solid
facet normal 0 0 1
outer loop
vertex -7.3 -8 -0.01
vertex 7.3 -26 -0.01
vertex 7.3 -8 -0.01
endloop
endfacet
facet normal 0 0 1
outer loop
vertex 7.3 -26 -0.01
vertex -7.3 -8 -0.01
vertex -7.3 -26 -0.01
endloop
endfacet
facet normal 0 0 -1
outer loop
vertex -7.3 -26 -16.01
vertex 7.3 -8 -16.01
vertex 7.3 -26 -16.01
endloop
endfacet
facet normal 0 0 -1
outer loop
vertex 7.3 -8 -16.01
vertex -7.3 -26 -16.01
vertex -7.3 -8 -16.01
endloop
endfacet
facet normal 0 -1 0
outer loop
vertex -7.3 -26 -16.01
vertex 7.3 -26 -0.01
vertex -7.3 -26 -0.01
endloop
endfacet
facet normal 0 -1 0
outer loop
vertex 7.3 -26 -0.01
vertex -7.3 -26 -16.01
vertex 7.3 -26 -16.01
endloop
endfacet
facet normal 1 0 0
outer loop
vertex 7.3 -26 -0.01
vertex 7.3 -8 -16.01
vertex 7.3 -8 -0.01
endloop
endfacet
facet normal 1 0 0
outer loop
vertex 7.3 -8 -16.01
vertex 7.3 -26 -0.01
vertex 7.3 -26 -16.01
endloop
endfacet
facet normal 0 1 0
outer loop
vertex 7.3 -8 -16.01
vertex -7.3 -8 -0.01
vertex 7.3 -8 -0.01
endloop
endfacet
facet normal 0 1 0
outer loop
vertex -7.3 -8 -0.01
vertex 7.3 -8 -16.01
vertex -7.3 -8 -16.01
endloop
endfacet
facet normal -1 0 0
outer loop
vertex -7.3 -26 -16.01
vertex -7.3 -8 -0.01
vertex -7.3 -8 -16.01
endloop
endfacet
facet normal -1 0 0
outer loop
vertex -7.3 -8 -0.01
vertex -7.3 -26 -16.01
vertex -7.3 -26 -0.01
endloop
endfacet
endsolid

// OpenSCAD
/*
   Copyright 2015-2018 Scott Bezek and the splitflap contributors

   Licensed under the Apache License, Version 2.0 (the "License");
   you may not use this file except in compliance with the License.
   You may obtain a copy of the License at

       http://www.apache.org/licenses/LICENSE-2.0

   Unless required by applicable law or agreed to in writing, software
   distributed under the License is distributed on an "AS IS" BASIS,
   WITHOUT WARRANTIES OR CONDITIONS OF ANY KIND, either express or implied.
   See the License for the specific language governing permissions and
   limitations under the License.
*/

28byj48_chassis_radius = 28/2;
28byj48_chassis_height = 19;
28byj48_shaft_offset = 8;
28byj48_mount_outer_radius = 3.5;
28byj48_mount_hole_radius = 4.2/2;
28byj48_mount_center_offset = 35/2;
28byj48_mount_bracket_height = 0.8;

28byj48_shaft_collar_radius = 9/2;
28byj48_shaft_collar_height = 1.5;

28byj48_shaft_radius = 5/2;
28byj48_shaft_height = 10;
28byj48_shaft_slotted_width = 3;
28byj48_shaft_slotted_height = 6;

28byj48_backpack_width = 14.6;
28byj48_backpack_extent = 18; // seen values from 17-18
28byj48_backpack_height = 16;

// Exports for use in other files:
function 28byj48_mount_bracket_height() = 28byj48_mount_bracket_height;
function 28byj48_shaft_radius() = 28byj48_shaft_radius;
function 28byj48_mount_center_offset() = 28byj48_mount_center_offset;
function 28byj48_chassis_radius() = 28byj48_chassis_radius;
function 28byj48_shaft_offset() = 28byj48_shaft_offset;
function 28byj48_chassis_height() = 28byj48_chassis_height;
function 28byj48_backpack_extent() = 28byj48_backpack_extent;

// Basic 28BYJ-48 model based on various dimensioned drawings.
// Origin is centered on the shaft, on the front face of the motor, with the shaft in the +z direction
module Stepper28BYJ48() {
    $fn = 60;

    eps = 0.01;

    gray = [0.7, 0.7, 0.7];
    gold = [1, 0.843, 0];
    blue = [0, 0, 1];

    module mounting_holes() {
        linear_extrude(height=28byj48_mount_bracket_height) {
        difference() {
            hull() {
                translate([28byj48_mount_center_offset, 0]) {
                    circle(r=28byj48_mount_outer_radius);
                }
                translate([-28byj48_mount_center_offset, 0]) {
                    circle(r=28byj48_mount_outer_radius);
                }
            }

            translate([28byj48_mount_center_offset, 0]) {
                circle(r=28byj48_mount_hole_radius);
            }
            translate([-28byj48_mount_center_offset, 0]) {
                circle(r=28byj48_mount_hole_radius);
            }
        }
        }
    }

    module shaft_collar() {
        cylinder(r=28byj48_shaft_collar_radius, h=28byj48_shaft_collar_height + eps);
    }

    module shaft() {
         color_selector(gold) {
            difference() {
                cylinder(r=28byj48_shaft_radius, h=28byj48_shaft_height);
                translate([-(28byj48_shaft_radius + eps), 28byj48_shaft_slotted_width / 2, 28byj48_shaft_height - 28byj48_shaft_slotted_height]) {
                    cube([(28byj48_shaft_radius+eps)*2, 28byj48_shaft_radius, 28byj48_shaft_slotted_height+eps]);
                }
                translate([-(28byj48_shaft_radius + eps), - 28byj48_shaft_radius - (28byj48_shaft_slotted_width / 2), 28byj48_shaft_height - 28byj48_shaft_slotted_height]) {
                    cube([(28byj48_shaft_radius+eps)*2, 28byj48_shaft_radius, 28byj48_shaft_slotted_height+eps]);
                }
            }
        }
    }

    module chassis() {
         color_selector(gray) {
            translate([0, 0, -28byj48_chassis_height]) {
                cylinder(r=28byj48_chassis_radius, h=28byj48_chassis_height);
            }
            translate([0, 0, -28byj48_mount_bracket_height - eps]) {
                mounting_holes();
            }
            translate([0, 28byj48_shaft_offset, -eps]) {
                shaft_collar();
            }
        }
    }

    module backpack() {
         color_selector(blue) {
            translate([-28byj48_backpack_width/2, 0, -28byj48_backpack_height - eps]) {
                cube([28byj48_backpack_width, 28byj48_backpack_extent, 28byj48_backpack_height]);
            }
        }
    }

    translate([0, -28byj48_shaft_offset, 0]) {
        chassis();
        translate([0, 28byj48_shaft_offset, 0]) {
            shaft();
        }
        translate([0, -28byj48_backpack_extent, 0]) {
            backpack();
        }
    }
}

// Example usage:
Stepper28BYJ48();

        module color_selector(c) {
            precision = 0.0000001;  // arbitrary
            function compare_floats(x, y, i=0) = 
                  (len(x) != len(y)) ? false  // if arrays differ in length, they can't be equal
                : (i >= len(x)) ? true  // if we've hit the end of the arrays without issue, we're equal
                : (x[i] - precision <= y[i]) && x[i] + precision >= y[i]
                    ? compare_floats(x, y, i+1)
                    : false;  // not equal, short circuit

            if (c == [0, 0, 1] || compare_floats(c, [0, 0, 1]))
                children();
        }
                    
